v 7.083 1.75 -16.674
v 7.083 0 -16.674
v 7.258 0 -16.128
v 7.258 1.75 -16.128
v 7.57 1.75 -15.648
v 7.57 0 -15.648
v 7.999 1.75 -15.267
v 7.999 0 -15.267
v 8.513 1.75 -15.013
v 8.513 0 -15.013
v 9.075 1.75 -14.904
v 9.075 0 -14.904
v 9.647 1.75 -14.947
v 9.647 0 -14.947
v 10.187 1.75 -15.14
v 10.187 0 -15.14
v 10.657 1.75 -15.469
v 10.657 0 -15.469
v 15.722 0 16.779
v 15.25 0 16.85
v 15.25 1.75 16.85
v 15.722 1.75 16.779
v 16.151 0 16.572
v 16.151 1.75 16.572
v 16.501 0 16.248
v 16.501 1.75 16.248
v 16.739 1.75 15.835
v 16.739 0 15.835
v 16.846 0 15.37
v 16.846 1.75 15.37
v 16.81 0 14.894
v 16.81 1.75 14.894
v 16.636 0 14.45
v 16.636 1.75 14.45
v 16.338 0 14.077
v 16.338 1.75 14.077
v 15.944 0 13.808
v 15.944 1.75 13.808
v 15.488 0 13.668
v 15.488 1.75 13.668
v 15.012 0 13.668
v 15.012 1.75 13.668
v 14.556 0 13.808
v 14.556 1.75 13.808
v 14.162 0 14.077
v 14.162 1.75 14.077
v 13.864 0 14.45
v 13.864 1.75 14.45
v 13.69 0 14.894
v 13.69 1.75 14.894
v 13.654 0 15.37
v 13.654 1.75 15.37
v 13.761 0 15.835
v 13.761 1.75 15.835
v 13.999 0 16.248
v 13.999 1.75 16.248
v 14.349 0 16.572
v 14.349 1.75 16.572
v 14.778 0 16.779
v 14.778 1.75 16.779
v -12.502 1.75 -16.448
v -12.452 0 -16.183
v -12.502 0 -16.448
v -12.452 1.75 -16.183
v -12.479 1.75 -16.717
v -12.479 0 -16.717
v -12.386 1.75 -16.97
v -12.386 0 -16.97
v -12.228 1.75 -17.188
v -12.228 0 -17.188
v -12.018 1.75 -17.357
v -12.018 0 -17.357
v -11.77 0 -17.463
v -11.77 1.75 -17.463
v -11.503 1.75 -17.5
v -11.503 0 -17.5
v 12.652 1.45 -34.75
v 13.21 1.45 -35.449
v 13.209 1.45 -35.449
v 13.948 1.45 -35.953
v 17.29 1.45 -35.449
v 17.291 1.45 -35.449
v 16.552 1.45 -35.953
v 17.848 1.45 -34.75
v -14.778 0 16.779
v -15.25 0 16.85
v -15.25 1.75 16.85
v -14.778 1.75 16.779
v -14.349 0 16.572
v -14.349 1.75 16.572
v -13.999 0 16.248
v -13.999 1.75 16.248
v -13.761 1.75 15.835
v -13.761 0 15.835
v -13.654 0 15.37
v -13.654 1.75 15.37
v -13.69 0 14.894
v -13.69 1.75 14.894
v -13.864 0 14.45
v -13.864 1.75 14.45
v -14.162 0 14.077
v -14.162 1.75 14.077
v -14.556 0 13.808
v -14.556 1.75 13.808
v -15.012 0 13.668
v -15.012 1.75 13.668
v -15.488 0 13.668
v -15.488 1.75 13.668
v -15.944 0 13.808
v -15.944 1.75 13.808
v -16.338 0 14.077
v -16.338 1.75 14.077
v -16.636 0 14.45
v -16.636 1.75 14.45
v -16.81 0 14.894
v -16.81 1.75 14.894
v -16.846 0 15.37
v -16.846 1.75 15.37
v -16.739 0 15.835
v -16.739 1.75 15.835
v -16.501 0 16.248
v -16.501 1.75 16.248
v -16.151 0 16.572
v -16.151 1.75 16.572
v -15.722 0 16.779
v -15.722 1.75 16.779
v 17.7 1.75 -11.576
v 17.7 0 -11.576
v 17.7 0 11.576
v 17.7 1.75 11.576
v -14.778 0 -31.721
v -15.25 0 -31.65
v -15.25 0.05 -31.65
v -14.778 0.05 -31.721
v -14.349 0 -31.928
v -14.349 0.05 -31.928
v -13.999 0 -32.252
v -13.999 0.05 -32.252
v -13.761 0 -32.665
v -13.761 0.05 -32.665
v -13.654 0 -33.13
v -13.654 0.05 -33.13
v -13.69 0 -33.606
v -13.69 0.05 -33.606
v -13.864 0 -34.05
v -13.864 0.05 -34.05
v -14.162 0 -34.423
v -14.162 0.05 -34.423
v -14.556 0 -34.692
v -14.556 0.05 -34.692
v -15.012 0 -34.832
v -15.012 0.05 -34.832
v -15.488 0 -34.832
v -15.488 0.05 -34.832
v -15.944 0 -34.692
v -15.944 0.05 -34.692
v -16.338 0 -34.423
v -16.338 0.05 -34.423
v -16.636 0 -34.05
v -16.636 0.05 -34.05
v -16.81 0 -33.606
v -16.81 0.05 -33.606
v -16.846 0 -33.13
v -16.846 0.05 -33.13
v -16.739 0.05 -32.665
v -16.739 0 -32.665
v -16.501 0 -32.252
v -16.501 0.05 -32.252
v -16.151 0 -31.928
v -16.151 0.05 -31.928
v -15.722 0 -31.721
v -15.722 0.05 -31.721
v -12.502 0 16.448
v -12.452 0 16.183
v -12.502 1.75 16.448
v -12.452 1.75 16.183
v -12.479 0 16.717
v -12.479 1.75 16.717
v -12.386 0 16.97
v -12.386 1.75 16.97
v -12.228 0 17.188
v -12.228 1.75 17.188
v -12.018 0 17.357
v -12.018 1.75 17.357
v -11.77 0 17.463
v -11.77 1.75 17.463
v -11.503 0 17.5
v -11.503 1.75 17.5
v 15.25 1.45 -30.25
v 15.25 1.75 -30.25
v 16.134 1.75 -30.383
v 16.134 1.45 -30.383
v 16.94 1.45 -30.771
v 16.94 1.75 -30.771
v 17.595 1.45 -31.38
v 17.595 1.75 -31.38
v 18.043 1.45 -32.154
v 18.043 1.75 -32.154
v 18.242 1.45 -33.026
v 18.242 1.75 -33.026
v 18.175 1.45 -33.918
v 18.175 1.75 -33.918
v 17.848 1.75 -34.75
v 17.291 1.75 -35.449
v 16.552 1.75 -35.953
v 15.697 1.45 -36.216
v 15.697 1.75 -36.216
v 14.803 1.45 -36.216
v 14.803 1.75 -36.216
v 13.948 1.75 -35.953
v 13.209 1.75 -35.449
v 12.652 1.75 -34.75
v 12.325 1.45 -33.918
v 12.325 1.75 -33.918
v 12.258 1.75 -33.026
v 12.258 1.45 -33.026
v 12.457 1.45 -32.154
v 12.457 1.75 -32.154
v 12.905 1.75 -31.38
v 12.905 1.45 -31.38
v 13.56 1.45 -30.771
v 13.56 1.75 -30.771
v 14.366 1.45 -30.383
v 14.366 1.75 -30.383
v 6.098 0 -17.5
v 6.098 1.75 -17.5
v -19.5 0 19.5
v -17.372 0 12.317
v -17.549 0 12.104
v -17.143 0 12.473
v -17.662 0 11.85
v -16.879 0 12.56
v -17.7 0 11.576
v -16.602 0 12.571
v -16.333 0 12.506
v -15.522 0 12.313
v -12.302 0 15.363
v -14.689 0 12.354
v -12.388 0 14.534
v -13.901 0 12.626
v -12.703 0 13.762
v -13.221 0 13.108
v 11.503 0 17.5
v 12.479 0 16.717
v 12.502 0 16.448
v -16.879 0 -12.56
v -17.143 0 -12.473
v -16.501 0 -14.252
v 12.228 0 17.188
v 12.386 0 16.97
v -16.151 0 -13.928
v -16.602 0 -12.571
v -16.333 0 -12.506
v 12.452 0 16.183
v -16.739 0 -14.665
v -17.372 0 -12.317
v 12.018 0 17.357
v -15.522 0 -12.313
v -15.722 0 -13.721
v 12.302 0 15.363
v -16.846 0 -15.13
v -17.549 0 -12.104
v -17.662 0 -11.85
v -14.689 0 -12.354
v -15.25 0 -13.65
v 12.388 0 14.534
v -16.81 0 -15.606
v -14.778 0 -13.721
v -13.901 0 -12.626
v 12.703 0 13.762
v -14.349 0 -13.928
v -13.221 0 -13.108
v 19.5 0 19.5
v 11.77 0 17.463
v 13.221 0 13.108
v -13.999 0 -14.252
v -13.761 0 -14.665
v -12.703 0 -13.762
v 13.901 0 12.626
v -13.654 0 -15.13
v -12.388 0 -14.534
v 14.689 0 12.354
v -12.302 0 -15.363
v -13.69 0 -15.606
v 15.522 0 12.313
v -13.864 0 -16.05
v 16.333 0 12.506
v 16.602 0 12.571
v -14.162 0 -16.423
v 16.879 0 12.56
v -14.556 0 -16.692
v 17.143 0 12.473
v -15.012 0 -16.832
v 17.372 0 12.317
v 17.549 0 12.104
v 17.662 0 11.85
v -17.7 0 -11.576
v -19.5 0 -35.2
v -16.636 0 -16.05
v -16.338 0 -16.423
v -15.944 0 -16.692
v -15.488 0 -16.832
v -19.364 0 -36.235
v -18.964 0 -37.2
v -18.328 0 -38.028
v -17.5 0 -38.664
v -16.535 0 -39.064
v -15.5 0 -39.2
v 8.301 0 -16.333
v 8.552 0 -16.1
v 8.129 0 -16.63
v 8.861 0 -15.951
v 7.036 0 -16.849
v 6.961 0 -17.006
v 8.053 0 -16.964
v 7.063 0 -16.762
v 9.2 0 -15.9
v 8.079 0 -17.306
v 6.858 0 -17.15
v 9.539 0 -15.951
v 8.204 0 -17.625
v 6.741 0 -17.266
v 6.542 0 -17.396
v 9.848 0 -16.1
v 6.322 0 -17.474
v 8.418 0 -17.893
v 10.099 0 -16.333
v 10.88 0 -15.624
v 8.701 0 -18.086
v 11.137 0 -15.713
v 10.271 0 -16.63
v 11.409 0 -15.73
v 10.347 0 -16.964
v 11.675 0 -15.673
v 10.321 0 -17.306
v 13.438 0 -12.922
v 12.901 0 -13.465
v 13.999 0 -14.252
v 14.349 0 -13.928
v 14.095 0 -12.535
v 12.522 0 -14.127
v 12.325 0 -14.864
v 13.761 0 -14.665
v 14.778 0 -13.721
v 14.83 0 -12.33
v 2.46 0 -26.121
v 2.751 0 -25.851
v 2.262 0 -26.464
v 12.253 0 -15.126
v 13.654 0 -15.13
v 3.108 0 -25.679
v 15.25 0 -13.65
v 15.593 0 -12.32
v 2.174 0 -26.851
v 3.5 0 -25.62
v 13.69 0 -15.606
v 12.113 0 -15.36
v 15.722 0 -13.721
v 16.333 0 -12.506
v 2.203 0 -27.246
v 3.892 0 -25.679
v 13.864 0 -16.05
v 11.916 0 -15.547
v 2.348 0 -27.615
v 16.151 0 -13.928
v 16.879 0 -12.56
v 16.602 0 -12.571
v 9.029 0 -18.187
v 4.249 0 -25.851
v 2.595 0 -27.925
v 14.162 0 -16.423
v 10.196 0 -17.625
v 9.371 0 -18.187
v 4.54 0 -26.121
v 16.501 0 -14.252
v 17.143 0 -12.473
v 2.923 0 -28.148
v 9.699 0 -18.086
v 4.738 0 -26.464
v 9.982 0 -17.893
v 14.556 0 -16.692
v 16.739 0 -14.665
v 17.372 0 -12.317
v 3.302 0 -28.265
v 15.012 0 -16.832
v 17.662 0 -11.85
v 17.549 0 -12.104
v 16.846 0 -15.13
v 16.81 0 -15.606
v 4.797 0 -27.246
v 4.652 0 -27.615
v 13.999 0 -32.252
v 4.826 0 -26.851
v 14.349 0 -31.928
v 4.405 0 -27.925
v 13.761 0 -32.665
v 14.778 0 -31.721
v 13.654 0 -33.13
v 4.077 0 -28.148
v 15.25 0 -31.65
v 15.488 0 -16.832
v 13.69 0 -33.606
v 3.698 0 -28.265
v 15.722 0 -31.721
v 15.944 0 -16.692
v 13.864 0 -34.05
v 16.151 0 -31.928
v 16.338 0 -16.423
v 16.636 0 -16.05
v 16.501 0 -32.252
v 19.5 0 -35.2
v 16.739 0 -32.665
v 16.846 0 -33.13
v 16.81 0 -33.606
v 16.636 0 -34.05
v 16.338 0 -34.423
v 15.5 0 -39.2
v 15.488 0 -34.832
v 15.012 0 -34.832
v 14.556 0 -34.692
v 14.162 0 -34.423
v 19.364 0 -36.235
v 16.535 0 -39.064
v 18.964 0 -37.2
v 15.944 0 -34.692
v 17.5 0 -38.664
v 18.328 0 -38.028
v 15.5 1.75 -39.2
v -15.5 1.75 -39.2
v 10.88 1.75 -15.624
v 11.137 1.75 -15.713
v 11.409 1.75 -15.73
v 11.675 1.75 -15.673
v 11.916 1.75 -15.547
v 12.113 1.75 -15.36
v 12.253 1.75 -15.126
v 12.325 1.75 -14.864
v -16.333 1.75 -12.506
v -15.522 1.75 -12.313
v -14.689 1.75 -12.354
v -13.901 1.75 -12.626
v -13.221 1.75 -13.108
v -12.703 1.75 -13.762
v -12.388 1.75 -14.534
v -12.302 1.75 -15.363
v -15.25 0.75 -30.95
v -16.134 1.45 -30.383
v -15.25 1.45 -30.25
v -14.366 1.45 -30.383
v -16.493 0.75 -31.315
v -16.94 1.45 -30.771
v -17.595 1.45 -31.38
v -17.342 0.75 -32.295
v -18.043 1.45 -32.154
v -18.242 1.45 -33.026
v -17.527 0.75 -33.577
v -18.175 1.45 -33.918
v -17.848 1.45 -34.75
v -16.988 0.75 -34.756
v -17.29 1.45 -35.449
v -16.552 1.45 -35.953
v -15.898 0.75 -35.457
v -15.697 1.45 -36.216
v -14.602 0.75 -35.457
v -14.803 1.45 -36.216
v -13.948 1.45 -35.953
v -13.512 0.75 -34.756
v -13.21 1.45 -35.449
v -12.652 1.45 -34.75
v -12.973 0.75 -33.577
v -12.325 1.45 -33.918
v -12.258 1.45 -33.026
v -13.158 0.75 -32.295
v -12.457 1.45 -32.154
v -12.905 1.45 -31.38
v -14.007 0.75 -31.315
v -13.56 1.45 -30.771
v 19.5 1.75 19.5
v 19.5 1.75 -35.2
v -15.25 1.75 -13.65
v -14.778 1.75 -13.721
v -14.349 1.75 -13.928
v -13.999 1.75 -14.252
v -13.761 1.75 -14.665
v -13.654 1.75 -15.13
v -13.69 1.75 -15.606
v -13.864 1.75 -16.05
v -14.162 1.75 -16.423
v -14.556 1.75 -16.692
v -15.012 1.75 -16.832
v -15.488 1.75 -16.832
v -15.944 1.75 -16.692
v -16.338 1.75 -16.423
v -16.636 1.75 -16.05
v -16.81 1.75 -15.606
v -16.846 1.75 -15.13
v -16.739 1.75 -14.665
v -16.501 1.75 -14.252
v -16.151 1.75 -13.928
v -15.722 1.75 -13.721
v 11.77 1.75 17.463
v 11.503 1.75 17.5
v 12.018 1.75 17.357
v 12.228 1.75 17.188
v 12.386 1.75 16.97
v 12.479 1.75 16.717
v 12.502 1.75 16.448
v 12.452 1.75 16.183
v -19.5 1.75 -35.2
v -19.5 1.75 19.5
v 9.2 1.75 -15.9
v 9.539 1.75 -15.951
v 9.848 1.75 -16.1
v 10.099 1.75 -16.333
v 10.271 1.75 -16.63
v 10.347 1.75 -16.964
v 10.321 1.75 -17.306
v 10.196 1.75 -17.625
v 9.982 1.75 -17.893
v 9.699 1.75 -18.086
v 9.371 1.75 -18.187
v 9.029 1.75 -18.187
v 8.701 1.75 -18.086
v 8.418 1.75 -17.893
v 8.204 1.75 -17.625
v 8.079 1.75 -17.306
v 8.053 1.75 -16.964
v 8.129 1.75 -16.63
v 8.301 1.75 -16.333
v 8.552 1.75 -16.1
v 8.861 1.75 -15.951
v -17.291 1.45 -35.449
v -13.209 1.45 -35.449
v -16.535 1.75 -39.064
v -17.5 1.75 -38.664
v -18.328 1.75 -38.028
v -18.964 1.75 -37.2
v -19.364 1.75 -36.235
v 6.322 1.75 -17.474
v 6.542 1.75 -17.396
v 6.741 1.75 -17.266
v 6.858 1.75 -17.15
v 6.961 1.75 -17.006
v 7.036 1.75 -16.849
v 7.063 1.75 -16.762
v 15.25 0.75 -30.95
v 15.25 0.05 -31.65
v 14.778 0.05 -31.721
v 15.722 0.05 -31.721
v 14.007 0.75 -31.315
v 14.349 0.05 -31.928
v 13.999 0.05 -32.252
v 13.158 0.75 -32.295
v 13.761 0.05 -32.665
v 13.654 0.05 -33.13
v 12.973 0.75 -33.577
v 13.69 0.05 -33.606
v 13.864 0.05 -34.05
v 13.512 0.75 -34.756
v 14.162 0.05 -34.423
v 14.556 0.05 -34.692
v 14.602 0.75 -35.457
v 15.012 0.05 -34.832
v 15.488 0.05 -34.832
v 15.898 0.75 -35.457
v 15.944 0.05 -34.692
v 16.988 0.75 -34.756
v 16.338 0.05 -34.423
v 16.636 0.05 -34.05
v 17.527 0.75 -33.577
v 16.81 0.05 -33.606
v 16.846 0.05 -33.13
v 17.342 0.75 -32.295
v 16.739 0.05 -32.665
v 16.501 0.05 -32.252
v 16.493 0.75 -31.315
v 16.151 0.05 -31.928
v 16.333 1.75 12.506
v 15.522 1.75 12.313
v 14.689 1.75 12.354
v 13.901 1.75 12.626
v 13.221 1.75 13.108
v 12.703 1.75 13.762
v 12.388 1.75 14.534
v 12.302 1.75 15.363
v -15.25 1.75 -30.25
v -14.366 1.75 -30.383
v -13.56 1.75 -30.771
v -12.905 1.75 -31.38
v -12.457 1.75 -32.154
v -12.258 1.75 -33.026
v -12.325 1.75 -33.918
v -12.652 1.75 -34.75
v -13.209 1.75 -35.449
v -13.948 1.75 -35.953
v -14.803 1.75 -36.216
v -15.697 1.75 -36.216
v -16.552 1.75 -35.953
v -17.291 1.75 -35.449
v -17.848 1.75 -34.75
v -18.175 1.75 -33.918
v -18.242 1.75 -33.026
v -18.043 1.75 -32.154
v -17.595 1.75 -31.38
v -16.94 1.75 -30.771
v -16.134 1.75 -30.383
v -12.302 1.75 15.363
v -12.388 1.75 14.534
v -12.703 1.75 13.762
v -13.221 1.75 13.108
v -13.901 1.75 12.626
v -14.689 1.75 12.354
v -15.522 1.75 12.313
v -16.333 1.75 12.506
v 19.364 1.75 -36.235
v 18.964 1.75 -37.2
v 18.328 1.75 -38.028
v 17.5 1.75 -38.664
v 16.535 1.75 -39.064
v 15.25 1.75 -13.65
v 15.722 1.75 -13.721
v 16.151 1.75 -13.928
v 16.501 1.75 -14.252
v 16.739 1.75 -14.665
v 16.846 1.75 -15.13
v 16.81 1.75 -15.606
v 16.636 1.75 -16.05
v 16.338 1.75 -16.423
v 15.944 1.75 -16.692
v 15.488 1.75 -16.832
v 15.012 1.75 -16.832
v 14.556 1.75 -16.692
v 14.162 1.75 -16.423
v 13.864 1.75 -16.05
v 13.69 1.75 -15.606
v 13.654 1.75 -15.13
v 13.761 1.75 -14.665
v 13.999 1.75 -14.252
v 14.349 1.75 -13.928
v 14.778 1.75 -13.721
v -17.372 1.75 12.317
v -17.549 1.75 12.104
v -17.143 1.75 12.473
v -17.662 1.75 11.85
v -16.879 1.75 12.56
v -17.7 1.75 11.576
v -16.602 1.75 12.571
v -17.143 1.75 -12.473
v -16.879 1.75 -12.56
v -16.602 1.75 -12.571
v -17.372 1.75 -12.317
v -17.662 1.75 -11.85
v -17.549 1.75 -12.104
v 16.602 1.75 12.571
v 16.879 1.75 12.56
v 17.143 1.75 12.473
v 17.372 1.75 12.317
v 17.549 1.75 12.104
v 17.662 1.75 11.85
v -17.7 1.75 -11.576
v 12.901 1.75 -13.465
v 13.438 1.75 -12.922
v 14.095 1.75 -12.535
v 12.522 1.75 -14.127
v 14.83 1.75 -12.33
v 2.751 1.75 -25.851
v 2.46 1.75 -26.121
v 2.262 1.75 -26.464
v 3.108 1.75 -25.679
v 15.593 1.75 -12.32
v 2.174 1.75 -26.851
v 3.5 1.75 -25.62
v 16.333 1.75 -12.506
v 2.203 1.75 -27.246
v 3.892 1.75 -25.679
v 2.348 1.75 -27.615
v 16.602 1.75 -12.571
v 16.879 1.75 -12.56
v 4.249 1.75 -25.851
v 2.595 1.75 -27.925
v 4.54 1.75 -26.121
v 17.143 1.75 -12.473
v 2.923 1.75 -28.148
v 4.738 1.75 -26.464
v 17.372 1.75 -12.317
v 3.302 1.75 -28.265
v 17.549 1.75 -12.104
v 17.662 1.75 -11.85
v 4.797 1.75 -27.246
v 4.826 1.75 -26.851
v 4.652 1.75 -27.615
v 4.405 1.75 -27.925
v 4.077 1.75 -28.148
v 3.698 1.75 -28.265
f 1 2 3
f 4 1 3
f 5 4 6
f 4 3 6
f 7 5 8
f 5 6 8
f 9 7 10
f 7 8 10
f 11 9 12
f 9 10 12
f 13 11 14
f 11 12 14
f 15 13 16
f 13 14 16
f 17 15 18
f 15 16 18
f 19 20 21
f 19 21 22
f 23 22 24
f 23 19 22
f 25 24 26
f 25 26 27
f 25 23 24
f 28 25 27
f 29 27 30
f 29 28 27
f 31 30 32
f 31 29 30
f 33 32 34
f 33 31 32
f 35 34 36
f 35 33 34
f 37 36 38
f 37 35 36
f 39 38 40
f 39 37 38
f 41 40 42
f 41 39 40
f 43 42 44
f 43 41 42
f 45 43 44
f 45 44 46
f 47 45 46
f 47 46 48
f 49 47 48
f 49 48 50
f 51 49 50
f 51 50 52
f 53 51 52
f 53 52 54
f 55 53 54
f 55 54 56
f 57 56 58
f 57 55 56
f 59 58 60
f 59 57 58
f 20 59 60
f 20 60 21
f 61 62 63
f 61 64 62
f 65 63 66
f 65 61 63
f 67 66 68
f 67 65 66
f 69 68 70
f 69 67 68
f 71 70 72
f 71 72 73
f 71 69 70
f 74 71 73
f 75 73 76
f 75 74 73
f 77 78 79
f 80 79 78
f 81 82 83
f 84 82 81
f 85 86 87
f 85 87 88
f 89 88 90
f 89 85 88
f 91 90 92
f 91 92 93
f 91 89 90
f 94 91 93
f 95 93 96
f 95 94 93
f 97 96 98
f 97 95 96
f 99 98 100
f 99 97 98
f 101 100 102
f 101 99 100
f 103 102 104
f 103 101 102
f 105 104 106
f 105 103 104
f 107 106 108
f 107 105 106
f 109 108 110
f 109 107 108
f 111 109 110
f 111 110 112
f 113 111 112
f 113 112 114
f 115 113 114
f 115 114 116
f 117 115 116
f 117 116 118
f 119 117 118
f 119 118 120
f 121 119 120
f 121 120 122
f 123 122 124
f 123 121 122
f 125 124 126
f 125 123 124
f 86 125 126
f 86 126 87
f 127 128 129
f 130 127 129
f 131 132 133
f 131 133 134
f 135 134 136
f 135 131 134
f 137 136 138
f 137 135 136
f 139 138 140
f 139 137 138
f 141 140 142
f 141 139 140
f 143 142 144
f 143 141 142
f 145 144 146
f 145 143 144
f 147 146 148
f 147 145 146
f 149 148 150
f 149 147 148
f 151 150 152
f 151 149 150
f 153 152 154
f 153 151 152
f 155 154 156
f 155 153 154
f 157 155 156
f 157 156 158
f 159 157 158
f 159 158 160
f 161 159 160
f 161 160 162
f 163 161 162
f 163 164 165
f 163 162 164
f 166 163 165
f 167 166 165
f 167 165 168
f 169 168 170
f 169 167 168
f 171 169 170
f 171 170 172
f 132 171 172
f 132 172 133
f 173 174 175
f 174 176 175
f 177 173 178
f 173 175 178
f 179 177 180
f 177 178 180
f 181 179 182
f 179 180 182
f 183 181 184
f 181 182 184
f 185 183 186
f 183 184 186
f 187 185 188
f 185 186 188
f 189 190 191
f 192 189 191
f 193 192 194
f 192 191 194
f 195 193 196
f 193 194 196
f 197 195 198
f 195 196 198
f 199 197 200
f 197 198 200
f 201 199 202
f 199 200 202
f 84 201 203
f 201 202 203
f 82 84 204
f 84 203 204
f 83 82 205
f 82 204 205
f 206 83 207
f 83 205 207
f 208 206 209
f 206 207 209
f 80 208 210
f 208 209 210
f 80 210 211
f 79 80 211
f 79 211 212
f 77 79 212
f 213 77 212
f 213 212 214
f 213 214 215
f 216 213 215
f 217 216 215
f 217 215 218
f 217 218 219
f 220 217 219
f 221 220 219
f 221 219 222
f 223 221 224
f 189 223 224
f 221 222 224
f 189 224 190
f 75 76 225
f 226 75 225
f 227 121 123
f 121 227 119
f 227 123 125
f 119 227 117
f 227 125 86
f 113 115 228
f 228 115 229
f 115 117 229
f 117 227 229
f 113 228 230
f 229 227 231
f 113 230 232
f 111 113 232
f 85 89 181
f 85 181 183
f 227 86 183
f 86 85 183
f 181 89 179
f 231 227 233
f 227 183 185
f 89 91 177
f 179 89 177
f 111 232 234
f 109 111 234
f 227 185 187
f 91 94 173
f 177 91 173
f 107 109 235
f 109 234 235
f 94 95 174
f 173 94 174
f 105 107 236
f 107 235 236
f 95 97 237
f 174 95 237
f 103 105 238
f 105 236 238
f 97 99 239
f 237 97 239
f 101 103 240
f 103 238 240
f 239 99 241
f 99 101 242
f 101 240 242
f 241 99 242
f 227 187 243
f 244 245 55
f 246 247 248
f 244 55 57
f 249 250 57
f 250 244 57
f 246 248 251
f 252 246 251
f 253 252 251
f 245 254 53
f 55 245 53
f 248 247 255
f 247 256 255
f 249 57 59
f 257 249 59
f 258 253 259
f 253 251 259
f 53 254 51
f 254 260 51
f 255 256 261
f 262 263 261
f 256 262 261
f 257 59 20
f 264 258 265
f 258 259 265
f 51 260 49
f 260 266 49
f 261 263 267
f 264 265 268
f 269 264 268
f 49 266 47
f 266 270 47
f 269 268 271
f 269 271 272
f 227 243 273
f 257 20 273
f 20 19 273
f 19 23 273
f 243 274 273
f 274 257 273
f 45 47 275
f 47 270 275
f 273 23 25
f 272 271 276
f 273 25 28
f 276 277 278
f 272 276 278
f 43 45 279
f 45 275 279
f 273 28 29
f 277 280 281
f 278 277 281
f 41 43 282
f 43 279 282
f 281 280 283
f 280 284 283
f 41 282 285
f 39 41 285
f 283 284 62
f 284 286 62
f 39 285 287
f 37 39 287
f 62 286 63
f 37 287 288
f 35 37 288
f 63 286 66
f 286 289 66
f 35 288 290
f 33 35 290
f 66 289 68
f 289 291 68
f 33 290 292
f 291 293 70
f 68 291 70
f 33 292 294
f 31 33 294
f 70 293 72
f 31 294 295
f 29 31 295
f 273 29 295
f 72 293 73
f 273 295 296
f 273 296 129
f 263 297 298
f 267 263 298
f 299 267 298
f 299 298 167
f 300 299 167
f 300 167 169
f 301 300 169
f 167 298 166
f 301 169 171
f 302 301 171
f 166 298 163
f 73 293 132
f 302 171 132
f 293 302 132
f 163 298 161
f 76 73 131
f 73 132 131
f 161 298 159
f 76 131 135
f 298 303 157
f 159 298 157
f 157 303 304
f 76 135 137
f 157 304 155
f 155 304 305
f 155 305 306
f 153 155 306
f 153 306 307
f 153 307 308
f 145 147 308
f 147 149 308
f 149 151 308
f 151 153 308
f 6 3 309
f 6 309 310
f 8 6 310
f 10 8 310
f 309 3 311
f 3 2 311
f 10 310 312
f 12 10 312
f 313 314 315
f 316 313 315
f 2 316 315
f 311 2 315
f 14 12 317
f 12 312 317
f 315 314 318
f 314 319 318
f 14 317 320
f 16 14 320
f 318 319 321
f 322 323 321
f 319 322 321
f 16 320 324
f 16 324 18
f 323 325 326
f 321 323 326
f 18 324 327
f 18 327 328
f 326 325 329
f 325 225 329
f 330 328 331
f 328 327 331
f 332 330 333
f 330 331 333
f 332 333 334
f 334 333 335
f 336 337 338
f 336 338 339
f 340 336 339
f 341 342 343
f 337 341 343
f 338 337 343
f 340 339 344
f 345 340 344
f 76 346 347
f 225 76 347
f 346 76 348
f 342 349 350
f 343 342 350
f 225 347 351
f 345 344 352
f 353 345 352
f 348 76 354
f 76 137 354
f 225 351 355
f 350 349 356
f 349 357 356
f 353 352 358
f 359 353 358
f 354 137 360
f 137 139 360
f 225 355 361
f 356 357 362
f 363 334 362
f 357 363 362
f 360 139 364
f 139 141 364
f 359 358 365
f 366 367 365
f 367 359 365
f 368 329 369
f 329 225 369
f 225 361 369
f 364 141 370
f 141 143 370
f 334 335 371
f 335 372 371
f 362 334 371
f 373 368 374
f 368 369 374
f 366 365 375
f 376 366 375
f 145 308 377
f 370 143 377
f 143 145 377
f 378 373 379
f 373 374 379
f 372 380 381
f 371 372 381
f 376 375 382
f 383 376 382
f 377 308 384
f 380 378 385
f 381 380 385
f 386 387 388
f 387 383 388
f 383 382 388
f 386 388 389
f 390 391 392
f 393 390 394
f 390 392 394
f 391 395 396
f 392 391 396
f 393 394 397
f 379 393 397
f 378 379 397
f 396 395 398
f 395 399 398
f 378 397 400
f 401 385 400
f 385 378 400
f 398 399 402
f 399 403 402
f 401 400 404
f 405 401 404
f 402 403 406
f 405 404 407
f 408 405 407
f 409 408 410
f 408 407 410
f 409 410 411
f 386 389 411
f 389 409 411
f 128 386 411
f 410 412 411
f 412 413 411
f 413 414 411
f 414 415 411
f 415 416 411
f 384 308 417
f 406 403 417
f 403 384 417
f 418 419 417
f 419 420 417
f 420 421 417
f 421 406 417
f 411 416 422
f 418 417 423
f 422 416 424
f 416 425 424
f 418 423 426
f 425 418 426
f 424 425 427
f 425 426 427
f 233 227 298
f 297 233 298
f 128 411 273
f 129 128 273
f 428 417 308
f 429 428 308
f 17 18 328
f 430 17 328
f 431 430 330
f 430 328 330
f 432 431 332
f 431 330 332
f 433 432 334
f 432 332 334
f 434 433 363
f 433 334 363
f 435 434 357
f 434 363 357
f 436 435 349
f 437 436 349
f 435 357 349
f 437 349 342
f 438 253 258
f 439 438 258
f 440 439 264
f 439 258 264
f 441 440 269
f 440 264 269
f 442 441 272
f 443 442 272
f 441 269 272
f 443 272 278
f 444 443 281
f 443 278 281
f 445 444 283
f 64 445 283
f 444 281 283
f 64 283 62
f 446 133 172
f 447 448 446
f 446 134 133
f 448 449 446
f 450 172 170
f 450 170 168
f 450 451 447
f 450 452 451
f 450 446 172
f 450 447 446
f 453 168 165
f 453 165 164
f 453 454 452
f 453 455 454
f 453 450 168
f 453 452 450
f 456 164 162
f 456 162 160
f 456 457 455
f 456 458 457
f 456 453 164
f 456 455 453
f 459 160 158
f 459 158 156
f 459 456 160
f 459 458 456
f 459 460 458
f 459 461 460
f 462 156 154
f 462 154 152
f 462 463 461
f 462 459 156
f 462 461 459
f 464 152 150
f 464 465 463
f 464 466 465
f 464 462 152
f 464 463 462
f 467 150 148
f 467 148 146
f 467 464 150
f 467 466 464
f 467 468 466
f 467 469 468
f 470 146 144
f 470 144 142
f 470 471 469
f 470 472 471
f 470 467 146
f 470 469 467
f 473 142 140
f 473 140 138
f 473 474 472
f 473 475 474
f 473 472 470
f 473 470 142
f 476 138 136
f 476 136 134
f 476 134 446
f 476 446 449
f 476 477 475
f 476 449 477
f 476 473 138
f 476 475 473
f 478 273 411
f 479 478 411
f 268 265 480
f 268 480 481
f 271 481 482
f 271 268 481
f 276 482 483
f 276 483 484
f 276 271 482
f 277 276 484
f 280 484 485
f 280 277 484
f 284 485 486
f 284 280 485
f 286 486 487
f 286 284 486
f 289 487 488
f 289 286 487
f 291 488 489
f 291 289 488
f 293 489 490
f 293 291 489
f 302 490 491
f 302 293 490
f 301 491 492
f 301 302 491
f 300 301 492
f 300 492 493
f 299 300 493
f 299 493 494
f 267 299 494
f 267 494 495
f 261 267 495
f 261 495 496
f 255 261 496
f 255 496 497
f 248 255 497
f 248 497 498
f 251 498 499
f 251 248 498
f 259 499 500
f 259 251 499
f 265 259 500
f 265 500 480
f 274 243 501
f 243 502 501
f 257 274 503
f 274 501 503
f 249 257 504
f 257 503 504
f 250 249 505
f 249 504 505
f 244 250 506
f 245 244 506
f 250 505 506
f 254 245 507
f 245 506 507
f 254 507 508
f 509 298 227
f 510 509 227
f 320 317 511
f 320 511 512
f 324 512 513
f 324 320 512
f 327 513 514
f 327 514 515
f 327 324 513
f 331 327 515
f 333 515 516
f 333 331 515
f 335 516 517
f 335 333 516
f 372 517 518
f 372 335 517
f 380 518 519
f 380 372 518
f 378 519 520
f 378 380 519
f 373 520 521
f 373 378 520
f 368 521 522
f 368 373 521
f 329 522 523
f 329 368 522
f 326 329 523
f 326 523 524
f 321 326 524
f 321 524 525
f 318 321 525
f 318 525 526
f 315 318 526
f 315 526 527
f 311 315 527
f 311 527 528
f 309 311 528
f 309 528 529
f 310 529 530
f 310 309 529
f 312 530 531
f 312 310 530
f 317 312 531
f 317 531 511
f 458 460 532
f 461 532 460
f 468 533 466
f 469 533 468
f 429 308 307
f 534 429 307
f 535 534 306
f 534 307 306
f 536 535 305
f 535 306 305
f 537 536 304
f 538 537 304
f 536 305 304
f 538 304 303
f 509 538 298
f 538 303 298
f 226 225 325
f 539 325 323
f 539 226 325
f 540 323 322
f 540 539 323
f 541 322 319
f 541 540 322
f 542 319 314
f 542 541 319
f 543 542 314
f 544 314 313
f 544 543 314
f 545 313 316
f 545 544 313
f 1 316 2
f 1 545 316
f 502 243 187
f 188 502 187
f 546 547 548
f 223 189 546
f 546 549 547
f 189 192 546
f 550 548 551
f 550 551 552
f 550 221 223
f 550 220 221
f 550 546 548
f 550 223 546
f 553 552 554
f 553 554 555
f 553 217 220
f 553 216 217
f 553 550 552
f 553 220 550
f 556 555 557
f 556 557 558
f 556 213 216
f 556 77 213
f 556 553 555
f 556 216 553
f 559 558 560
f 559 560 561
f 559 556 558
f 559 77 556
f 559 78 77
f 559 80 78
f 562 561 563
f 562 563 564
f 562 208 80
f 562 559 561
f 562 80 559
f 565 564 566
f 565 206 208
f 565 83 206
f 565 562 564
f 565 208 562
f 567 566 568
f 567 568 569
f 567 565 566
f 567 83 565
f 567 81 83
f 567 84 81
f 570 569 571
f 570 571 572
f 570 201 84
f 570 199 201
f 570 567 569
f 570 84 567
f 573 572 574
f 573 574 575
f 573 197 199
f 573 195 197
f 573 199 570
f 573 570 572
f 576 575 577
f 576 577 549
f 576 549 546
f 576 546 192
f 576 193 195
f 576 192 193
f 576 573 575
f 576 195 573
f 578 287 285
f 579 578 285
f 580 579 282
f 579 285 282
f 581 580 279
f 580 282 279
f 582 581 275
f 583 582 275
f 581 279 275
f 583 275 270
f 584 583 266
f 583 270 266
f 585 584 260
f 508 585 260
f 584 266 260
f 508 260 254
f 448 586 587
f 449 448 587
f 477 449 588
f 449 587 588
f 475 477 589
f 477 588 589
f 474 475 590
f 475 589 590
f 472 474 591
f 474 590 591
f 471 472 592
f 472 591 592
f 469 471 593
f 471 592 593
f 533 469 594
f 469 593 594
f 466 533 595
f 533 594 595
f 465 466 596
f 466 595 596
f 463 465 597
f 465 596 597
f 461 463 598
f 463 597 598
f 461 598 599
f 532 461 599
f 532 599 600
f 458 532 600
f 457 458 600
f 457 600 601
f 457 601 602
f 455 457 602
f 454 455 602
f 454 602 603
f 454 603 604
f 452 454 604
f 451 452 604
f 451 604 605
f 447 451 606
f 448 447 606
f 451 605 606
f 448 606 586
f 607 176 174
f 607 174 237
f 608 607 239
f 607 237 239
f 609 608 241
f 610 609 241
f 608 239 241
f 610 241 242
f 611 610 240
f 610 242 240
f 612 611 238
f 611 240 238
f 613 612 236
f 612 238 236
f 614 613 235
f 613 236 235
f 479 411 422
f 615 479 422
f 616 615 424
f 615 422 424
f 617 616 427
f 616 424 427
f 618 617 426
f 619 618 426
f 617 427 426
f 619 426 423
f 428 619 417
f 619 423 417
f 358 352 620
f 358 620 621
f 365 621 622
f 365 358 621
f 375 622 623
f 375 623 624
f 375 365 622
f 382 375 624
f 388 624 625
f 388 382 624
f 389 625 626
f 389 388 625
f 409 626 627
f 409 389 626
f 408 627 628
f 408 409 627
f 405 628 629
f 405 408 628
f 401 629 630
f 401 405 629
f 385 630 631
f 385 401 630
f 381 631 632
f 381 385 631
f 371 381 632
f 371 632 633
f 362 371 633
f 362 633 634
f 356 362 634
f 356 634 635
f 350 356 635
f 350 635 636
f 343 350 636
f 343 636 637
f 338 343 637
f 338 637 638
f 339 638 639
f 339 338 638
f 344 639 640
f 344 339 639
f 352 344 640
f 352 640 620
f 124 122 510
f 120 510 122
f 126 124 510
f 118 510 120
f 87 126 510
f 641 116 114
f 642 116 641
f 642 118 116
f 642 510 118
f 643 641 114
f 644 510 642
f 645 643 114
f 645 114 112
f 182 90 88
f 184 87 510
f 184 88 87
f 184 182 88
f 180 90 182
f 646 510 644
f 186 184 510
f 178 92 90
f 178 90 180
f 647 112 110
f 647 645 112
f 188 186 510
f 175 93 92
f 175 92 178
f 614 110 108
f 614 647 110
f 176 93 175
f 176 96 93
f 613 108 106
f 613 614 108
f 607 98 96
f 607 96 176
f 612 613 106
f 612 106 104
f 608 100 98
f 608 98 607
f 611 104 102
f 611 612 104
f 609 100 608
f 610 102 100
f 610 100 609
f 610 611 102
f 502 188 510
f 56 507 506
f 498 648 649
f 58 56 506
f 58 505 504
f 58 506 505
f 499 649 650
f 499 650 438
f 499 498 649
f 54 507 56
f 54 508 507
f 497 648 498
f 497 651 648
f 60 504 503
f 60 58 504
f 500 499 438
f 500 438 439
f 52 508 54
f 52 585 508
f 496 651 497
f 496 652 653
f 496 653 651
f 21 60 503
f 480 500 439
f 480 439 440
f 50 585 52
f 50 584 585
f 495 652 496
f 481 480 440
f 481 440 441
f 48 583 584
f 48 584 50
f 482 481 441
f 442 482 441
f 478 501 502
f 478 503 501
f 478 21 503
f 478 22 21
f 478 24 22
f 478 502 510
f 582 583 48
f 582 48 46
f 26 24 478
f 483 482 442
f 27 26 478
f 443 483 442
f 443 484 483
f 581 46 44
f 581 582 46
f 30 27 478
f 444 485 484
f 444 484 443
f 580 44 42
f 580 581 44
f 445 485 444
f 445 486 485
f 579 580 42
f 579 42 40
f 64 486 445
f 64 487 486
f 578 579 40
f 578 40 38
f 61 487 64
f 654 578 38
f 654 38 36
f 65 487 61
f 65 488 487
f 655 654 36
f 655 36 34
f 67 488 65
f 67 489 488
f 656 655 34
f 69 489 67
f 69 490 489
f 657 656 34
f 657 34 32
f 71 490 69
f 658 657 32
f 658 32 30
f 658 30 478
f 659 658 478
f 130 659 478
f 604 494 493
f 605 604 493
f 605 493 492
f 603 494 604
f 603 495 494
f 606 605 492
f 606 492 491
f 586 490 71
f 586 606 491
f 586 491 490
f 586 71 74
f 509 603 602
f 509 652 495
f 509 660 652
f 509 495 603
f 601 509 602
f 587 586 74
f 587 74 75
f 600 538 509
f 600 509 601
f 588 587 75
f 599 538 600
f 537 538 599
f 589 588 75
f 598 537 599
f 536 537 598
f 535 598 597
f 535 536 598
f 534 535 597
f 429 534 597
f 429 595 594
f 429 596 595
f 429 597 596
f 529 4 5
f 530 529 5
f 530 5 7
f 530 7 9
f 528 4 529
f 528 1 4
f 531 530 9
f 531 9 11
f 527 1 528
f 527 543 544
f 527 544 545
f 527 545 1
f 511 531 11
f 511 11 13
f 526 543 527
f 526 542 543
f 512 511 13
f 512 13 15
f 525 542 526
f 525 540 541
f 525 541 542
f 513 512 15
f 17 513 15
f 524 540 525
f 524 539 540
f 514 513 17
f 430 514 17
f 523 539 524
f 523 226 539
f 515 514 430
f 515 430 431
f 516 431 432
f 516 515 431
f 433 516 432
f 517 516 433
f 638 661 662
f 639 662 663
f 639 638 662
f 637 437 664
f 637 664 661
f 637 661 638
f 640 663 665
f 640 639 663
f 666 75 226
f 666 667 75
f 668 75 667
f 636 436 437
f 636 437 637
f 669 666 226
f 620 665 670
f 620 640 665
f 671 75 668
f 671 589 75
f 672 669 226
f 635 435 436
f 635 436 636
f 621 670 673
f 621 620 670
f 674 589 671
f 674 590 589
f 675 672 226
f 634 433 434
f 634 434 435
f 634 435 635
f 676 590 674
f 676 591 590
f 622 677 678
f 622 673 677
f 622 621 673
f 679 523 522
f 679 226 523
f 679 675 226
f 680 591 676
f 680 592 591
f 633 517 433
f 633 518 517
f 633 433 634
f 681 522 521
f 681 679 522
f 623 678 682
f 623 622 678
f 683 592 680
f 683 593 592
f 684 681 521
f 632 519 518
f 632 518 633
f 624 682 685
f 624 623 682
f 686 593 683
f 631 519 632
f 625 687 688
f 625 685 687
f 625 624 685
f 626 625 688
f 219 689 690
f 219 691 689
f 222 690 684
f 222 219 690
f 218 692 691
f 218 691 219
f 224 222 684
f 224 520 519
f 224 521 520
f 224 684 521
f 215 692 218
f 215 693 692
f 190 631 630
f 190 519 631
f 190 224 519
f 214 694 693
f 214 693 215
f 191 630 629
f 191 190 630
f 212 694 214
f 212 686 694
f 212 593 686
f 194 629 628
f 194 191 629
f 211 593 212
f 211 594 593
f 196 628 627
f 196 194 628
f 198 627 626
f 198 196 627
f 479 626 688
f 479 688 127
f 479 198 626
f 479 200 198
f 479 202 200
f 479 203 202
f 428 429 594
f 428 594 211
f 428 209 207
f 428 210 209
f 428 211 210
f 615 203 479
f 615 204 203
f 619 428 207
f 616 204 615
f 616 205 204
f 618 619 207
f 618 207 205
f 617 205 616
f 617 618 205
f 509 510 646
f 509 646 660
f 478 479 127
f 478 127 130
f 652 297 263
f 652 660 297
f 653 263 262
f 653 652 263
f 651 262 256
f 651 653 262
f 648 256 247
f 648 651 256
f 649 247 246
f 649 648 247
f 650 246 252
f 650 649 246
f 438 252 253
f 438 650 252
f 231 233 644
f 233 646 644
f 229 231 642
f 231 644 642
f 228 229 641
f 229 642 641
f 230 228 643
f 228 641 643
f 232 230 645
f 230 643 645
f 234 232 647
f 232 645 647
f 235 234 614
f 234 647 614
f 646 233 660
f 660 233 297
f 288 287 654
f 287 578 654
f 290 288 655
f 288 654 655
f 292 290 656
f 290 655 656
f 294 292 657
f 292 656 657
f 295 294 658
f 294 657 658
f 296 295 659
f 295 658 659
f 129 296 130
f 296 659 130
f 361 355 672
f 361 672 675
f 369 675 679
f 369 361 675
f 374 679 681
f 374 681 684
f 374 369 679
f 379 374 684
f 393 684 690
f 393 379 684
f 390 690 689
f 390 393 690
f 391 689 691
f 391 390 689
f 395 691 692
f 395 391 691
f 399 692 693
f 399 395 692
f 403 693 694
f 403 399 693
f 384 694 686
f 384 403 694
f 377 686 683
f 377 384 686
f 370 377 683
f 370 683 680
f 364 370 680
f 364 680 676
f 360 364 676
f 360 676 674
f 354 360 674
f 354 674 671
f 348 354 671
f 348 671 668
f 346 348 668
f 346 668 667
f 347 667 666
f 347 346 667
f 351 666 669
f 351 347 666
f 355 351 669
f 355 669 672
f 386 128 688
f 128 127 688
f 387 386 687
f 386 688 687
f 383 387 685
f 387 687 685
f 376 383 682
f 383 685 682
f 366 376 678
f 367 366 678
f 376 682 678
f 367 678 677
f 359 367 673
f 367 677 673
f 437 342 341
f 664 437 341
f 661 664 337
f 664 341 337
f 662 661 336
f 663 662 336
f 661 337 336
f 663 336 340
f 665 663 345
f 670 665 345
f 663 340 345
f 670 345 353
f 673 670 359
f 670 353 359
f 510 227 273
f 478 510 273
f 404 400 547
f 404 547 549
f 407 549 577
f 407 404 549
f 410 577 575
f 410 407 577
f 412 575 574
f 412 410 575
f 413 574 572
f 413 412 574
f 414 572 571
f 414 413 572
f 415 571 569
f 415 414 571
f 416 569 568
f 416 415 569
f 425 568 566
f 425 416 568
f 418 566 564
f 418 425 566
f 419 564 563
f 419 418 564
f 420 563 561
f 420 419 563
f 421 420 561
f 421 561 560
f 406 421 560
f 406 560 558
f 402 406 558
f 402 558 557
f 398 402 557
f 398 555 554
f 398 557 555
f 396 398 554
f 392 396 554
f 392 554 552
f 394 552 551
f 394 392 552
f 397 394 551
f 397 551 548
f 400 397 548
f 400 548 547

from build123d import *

# Parameters (mm, degrees)
SKETCH1_R               = 1.6
SKETCH1_R_2             = 1.15
SKETCH1_R_3             = 1.33
BASE_SHAPE_DEPTH        = 1.75
MILLING_FILLETS_R       = 1
SKETCH3_R               = 3
SCREW_HEAD_CUT_DEPTH    = 0.3
SCREW_HEAD_CHAMFER_SIZE = 1.4


with BuildPart() as part:
    # Sketch1 → Base shape (new body)
    with BuildSketch(Plane(origin=(0, 0, 0), x_dir=(1, 0, 0), z_dir=(0, 1, 0))):
        with BuildLine():
            Line((15.5, 39.2), (-15.5, 39.2))
            ThreePointArc((-15.5, 39.2), (-18.328427125, 38.028427125), (-19.5, 35.2))
            Line((-19.5, 35.2), (-19.5, -19.5))
            Line((-19.5, -19.5), (19.5, -19.5))
            Line((19.5, -19.5), (19.5, 35.2))
            ThreePointArc((19.5, 35.2), (18.328427125, 38.028427125), (15.5, 39.2))
        make_face()
        with Locations(Location((-15.25, -15.25, 0), (0, 0, 270))):
            Circle(SKETCH1_R, mode=Mode.SUBTRACT)
        with Locations(Location((15.25, -15.25, 0), (0, 0, 270))):
            Circle(SKETCH1_R, mode=Mode.SUBTRACT)
        with BuildLine():
            ThreePointArc((-17.7, 13.606832327), (-13.284874461, 13.049822367), (-13.341630288, 17.499583304))
            Line((-13.341630288, 17.499583304), (7.05, 17.499583304))
            Line((7.05, 17.499583304), (7.05, 17.05))
            ThreePointArc((7.05, 17.05), (8.336587223, 15.08098543), (10.656528722, 15.46853736))
            ThreePointArc((10.656528722, 15.46853736), (11.674639953, 15.673161101), (12.325380263, 14.863866097))
            ThreePointArc((12.325380263, 14.863866097), (14.578174541, 12.377518398), (17.7, 13.606832327))
            Line((17.7, 13.606832327), (17.7, -13.606832327))
            ThreePointArc((17.7, -13.606832327), (13.284874461, -13.049822367), (13.341630288, -17.499583304))
            Line((13.341630288, -17.499583304), (-13.341630288, -17.499583304))
            ThreePointArc((-13.341630288, -17.499583304), (-13.284874461, -13.049822367), (-17.7, -13.606832327))
            Line((-17.7, -13.606832327), (-17.7, 13.606832327))
        make_face(mode=Mode.SUBTRACT)
        with Locations(Location((-15.25, 15.25, 0), (0, 0, 270))):
            Circle(SKETCH1_R, mode=Mode.SUBTRACT)
        with Locations(Location((-15.25, 33.25, 0), (0, 0, 270))):
            Circle(SKETCH1_R, mode=Mode.SUBTRACT)
        with Locations(Location((9.2, 17.05, 0), (0, 0, 270))):
            Circle(SKETCH1_R_2, mode=Mode.SUBTRACT)
        with Locations(Location((15.25, 15.25, 0), (0, 0, 270))):
            Circle(SKETCH1_R, mode=Mode.SUBTRACT)
        with Locations(Location((3.5, 26.95, 0), (0, 0, 270))):
            Circle(SKETCH1_R_3, mode=Mode.SUBTRACT)
        with Locations(Location((15.25, 33.25, 0), (0, 0, 270))):
            Circle(SKETCH1_R, mode=Mode.SUBTRACT)
    extrude(amount=BASE_SHAPE_DEPTH)

    # Milling fillets
    milling_fillets_edges = [part.edges().sort_by_distance(p)[0] for p in [
        (-17.7, 0.875, 13.606832327),
        (-13.341630288, 0.875, 17.499583304),
        (13.341630288, 0.875, 17.499583304),
        (17.7, 0.875, 13.606832327),
        (17.7, 0.875, -13.606832327),
        (-13.341630288, 0.875, -17.499583304),
        (-17.7, 0.875, -13.606832327),
        (7.05, 0.875, -17.499583304),
    ]]
    fillet(milling_fillets_edges, radius=MILLING_FILLETS_R)

    # Sketch3 → Screw head cut (cut)
    with BuildSketch(Plane(origin=(0, 1.75, 0), x_dir=(1, 0, 0), z_dir=(0, 1, 0))):
        with Locations(Location((-15.25, 33.25, 0), (0, 0, 270))):
            Circle(SKETCH3_R)
        with Locations(Location((15.25, 33.25, 0), (0, 0, 270))):
            Circle(SKETCH3_R)
    extrude(amount=-SCREW_HEAD_CUT_DEPTH, mode=Mode.SUBTRACT)

    # Screw head chamfer
    screw_head_chamfer_edges = [part.edges().sort_by_distance(p)[0] for p in [
        (-15.25, 1.45, -34.85),
        (15.25, 1.45, -34.85),
    ]]
    chamfer(screw_head_chamfer_edges, length=SCREW_HEAD_CHAMFER_SIZE - 0.0001)  # a hair under: the kernel refuses the full size


solid = part.part
